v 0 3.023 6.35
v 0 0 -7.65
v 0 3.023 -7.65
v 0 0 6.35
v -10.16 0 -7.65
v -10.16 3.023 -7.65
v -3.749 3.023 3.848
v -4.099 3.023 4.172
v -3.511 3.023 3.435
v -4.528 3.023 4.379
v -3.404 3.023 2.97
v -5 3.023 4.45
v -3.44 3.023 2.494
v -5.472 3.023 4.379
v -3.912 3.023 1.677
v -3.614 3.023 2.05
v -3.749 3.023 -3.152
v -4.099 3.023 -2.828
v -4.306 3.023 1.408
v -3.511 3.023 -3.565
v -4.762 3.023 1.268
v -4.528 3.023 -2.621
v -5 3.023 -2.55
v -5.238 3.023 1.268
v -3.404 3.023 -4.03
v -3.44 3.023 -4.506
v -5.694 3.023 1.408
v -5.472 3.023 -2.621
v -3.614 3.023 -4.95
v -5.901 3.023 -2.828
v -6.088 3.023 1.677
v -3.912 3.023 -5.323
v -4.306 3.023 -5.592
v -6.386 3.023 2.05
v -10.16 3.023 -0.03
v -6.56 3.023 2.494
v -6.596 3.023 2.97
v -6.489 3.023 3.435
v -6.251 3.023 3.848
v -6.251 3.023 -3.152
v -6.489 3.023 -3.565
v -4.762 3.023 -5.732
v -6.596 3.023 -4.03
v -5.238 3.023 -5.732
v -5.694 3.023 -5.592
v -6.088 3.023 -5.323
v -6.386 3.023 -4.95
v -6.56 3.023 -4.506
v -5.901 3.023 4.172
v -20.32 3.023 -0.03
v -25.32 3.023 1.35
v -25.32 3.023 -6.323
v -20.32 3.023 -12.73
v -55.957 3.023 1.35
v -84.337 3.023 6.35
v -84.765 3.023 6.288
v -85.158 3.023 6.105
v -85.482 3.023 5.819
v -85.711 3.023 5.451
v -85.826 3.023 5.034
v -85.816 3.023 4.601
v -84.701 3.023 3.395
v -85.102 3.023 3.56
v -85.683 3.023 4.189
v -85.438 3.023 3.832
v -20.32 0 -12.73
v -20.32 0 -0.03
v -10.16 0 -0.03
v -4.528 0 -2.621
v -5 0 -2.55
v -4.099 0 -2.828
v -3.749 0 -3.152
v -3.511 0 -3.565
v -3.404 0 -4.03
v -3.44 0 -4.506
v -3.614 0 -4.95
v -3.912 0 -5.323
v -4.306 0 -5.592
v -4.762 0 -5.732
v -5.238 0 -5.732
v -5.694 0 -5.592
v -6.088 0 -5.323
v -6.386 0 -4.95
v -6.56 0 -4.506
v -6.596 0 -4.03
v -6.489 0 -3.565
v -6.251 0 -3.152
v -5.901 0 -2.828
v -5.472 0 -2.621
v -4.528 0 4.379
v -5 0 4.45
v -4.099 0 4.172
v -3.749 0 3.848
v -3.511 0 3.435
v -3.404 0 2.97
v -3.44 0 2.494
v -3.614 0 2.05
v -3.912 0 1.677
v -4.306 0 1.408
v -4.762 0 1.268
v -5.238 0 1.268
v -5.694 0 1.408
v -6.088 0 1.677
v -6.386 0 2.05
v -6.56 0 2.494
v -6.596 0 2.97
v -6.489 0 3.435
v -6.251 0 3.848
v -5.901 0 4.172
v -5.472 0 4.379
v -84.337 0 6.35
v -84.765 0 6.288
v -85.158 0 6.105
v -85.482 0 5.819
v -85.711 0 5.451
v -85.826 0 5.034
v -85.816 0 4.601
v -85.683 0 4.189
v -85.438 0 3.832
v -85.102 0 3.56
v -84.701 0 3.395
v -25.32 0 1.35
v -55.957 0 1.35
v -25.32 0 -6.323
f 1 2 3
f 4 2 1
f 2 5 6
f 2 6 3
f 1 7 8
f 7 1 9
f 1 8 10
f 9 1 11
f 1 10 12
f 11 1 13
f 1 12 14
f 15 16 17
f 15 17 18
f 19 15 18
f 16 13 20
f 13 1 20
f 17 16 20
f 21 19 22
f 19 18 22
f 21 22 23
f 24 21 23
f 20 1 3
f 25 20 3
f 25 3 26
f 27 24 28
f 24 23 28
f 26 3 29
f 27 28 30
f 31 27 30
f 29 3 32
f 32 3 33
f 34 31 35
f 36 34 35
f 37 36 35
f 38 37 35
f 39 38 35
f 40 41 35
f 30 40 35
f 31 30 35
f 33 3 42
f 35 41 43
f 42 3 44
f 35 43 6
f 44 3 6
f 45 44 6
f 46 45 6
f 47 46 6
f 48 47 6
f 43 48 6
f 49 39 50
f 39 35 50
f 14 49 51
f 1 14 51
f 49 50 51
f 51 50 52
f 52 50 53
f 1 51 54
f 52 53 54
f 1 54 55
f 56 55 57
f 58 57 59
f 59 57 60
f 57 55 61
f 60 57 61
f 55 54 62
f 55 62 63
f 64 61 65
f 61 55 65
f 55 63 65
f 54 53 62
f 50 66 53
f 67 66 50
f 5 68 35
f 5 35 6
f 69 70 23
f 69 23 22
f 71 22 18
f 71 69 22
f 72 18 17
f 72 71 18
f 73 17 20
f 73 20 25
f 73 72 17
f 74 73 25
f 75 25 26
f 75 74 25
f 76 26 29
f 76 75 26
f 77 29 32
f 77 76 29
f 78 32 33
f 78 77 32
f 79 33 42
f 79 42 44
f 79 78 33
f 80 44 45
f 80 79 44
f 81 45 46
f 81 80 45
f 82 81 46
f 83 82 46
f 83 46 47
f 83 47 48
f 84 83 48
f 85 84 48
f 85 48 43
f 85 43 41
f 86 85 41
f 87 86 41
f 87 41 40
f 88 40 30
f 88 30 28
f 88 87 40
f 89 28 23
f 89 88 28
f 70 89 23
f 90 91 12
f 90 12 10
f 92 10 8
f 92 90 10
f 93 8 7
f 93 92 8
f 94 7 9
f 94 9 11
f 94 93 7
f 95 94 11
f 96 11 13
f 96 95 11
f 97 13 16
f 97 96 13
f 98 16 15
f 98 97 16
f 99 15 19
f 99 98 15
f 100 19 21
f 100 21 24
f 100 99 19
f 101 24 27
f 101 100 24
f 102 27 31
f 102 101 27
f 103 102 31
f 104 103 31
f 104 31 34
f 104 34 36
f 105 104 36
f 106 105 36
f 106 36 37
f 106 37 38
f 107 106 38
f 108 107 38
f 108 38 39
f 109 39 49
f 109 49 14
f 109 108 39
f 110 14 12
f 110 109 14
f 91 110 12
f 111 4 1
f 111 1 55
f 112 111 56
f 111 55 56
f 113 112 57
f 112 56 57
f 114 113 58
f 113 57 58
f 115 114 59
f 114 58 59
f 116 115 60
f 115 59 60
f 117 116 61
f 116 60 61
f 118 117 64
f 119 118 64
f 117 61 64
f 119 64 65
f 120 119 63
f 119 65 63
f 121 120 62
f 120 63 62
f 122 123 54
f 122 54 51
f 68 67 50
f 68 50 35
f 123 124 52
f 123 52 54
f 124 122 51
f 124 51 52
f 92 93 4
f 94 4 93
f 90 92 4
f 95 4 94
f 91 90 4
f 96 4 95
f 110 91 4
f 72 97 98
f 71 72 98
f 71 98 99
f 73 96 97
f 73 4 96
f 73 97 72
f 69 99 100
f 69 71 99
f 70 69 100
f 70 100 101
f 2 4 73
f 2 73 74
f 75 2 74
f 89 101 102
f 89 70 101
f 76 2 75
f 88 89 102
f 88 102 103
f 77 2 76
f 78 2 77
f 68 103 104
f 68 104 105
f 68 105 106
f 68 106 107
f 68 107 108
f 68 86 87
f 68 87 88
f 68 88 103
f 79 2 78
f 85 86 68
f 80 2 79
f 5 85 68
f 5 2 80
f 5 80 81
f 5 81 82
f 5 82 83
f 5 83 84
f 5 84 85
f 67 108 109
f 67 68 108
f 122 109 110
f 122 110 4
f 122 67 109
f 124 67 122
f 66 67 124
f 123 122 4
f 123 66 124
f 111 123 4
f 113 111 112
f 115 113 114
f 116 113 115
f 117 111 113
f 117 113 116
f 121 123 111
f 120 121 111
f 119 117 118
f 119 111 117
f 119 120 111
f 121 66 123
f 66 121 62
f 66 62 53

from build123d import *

# Parameters (mm, degrees)
SKETCH2_R           = 1.6
BOSS_EXTRUDE1_DEPTH = 3.0226
FILLET1_R           = 1.5


with BuildPart() as part:
    # Sketch2 → Boss-Extrude1 (new body)
    with BuildSketch(Plane(origin=(0, 0, 0), x_dir=(1, 0, 0), z_dir=(0, 1, 0))):
        Polygon((0, -6.35), (-96.5, -6.35), (-20.32, 12.73), (-20.32, 0.03), (-10.16, 0.03), (-10.16, 7.65), (0, 7.65), align=None)
        with Locations(Location((-5, -2.85, 0), (0, 0, 270))):
            Circle(SKETCH2_R, mode=Mode.SUBTRACT)
        with Locations(Location((-5, 4.15, 0), (0, 0, 270))):
            Circle(SKETCH2_R, mode=Mode.SUBTRACT)
        Polygon((-25.32, -1.35), (-25.32, 6.323263145), (-55.956749809, -1.35), align=None, mode=Mode.SUBTRACT)
    extrude(amount=BOSS_EXTRUDE1_DEPTH)

    # Fillet1
    fillet1_edges = [part.edges().sort_by_distance(p)[0] for p in [
        (-96.5, 1.5113, 6.35),
    ]]
    fillet(fillet1_edges, radius=FILLET1_R)


solid = part.part
